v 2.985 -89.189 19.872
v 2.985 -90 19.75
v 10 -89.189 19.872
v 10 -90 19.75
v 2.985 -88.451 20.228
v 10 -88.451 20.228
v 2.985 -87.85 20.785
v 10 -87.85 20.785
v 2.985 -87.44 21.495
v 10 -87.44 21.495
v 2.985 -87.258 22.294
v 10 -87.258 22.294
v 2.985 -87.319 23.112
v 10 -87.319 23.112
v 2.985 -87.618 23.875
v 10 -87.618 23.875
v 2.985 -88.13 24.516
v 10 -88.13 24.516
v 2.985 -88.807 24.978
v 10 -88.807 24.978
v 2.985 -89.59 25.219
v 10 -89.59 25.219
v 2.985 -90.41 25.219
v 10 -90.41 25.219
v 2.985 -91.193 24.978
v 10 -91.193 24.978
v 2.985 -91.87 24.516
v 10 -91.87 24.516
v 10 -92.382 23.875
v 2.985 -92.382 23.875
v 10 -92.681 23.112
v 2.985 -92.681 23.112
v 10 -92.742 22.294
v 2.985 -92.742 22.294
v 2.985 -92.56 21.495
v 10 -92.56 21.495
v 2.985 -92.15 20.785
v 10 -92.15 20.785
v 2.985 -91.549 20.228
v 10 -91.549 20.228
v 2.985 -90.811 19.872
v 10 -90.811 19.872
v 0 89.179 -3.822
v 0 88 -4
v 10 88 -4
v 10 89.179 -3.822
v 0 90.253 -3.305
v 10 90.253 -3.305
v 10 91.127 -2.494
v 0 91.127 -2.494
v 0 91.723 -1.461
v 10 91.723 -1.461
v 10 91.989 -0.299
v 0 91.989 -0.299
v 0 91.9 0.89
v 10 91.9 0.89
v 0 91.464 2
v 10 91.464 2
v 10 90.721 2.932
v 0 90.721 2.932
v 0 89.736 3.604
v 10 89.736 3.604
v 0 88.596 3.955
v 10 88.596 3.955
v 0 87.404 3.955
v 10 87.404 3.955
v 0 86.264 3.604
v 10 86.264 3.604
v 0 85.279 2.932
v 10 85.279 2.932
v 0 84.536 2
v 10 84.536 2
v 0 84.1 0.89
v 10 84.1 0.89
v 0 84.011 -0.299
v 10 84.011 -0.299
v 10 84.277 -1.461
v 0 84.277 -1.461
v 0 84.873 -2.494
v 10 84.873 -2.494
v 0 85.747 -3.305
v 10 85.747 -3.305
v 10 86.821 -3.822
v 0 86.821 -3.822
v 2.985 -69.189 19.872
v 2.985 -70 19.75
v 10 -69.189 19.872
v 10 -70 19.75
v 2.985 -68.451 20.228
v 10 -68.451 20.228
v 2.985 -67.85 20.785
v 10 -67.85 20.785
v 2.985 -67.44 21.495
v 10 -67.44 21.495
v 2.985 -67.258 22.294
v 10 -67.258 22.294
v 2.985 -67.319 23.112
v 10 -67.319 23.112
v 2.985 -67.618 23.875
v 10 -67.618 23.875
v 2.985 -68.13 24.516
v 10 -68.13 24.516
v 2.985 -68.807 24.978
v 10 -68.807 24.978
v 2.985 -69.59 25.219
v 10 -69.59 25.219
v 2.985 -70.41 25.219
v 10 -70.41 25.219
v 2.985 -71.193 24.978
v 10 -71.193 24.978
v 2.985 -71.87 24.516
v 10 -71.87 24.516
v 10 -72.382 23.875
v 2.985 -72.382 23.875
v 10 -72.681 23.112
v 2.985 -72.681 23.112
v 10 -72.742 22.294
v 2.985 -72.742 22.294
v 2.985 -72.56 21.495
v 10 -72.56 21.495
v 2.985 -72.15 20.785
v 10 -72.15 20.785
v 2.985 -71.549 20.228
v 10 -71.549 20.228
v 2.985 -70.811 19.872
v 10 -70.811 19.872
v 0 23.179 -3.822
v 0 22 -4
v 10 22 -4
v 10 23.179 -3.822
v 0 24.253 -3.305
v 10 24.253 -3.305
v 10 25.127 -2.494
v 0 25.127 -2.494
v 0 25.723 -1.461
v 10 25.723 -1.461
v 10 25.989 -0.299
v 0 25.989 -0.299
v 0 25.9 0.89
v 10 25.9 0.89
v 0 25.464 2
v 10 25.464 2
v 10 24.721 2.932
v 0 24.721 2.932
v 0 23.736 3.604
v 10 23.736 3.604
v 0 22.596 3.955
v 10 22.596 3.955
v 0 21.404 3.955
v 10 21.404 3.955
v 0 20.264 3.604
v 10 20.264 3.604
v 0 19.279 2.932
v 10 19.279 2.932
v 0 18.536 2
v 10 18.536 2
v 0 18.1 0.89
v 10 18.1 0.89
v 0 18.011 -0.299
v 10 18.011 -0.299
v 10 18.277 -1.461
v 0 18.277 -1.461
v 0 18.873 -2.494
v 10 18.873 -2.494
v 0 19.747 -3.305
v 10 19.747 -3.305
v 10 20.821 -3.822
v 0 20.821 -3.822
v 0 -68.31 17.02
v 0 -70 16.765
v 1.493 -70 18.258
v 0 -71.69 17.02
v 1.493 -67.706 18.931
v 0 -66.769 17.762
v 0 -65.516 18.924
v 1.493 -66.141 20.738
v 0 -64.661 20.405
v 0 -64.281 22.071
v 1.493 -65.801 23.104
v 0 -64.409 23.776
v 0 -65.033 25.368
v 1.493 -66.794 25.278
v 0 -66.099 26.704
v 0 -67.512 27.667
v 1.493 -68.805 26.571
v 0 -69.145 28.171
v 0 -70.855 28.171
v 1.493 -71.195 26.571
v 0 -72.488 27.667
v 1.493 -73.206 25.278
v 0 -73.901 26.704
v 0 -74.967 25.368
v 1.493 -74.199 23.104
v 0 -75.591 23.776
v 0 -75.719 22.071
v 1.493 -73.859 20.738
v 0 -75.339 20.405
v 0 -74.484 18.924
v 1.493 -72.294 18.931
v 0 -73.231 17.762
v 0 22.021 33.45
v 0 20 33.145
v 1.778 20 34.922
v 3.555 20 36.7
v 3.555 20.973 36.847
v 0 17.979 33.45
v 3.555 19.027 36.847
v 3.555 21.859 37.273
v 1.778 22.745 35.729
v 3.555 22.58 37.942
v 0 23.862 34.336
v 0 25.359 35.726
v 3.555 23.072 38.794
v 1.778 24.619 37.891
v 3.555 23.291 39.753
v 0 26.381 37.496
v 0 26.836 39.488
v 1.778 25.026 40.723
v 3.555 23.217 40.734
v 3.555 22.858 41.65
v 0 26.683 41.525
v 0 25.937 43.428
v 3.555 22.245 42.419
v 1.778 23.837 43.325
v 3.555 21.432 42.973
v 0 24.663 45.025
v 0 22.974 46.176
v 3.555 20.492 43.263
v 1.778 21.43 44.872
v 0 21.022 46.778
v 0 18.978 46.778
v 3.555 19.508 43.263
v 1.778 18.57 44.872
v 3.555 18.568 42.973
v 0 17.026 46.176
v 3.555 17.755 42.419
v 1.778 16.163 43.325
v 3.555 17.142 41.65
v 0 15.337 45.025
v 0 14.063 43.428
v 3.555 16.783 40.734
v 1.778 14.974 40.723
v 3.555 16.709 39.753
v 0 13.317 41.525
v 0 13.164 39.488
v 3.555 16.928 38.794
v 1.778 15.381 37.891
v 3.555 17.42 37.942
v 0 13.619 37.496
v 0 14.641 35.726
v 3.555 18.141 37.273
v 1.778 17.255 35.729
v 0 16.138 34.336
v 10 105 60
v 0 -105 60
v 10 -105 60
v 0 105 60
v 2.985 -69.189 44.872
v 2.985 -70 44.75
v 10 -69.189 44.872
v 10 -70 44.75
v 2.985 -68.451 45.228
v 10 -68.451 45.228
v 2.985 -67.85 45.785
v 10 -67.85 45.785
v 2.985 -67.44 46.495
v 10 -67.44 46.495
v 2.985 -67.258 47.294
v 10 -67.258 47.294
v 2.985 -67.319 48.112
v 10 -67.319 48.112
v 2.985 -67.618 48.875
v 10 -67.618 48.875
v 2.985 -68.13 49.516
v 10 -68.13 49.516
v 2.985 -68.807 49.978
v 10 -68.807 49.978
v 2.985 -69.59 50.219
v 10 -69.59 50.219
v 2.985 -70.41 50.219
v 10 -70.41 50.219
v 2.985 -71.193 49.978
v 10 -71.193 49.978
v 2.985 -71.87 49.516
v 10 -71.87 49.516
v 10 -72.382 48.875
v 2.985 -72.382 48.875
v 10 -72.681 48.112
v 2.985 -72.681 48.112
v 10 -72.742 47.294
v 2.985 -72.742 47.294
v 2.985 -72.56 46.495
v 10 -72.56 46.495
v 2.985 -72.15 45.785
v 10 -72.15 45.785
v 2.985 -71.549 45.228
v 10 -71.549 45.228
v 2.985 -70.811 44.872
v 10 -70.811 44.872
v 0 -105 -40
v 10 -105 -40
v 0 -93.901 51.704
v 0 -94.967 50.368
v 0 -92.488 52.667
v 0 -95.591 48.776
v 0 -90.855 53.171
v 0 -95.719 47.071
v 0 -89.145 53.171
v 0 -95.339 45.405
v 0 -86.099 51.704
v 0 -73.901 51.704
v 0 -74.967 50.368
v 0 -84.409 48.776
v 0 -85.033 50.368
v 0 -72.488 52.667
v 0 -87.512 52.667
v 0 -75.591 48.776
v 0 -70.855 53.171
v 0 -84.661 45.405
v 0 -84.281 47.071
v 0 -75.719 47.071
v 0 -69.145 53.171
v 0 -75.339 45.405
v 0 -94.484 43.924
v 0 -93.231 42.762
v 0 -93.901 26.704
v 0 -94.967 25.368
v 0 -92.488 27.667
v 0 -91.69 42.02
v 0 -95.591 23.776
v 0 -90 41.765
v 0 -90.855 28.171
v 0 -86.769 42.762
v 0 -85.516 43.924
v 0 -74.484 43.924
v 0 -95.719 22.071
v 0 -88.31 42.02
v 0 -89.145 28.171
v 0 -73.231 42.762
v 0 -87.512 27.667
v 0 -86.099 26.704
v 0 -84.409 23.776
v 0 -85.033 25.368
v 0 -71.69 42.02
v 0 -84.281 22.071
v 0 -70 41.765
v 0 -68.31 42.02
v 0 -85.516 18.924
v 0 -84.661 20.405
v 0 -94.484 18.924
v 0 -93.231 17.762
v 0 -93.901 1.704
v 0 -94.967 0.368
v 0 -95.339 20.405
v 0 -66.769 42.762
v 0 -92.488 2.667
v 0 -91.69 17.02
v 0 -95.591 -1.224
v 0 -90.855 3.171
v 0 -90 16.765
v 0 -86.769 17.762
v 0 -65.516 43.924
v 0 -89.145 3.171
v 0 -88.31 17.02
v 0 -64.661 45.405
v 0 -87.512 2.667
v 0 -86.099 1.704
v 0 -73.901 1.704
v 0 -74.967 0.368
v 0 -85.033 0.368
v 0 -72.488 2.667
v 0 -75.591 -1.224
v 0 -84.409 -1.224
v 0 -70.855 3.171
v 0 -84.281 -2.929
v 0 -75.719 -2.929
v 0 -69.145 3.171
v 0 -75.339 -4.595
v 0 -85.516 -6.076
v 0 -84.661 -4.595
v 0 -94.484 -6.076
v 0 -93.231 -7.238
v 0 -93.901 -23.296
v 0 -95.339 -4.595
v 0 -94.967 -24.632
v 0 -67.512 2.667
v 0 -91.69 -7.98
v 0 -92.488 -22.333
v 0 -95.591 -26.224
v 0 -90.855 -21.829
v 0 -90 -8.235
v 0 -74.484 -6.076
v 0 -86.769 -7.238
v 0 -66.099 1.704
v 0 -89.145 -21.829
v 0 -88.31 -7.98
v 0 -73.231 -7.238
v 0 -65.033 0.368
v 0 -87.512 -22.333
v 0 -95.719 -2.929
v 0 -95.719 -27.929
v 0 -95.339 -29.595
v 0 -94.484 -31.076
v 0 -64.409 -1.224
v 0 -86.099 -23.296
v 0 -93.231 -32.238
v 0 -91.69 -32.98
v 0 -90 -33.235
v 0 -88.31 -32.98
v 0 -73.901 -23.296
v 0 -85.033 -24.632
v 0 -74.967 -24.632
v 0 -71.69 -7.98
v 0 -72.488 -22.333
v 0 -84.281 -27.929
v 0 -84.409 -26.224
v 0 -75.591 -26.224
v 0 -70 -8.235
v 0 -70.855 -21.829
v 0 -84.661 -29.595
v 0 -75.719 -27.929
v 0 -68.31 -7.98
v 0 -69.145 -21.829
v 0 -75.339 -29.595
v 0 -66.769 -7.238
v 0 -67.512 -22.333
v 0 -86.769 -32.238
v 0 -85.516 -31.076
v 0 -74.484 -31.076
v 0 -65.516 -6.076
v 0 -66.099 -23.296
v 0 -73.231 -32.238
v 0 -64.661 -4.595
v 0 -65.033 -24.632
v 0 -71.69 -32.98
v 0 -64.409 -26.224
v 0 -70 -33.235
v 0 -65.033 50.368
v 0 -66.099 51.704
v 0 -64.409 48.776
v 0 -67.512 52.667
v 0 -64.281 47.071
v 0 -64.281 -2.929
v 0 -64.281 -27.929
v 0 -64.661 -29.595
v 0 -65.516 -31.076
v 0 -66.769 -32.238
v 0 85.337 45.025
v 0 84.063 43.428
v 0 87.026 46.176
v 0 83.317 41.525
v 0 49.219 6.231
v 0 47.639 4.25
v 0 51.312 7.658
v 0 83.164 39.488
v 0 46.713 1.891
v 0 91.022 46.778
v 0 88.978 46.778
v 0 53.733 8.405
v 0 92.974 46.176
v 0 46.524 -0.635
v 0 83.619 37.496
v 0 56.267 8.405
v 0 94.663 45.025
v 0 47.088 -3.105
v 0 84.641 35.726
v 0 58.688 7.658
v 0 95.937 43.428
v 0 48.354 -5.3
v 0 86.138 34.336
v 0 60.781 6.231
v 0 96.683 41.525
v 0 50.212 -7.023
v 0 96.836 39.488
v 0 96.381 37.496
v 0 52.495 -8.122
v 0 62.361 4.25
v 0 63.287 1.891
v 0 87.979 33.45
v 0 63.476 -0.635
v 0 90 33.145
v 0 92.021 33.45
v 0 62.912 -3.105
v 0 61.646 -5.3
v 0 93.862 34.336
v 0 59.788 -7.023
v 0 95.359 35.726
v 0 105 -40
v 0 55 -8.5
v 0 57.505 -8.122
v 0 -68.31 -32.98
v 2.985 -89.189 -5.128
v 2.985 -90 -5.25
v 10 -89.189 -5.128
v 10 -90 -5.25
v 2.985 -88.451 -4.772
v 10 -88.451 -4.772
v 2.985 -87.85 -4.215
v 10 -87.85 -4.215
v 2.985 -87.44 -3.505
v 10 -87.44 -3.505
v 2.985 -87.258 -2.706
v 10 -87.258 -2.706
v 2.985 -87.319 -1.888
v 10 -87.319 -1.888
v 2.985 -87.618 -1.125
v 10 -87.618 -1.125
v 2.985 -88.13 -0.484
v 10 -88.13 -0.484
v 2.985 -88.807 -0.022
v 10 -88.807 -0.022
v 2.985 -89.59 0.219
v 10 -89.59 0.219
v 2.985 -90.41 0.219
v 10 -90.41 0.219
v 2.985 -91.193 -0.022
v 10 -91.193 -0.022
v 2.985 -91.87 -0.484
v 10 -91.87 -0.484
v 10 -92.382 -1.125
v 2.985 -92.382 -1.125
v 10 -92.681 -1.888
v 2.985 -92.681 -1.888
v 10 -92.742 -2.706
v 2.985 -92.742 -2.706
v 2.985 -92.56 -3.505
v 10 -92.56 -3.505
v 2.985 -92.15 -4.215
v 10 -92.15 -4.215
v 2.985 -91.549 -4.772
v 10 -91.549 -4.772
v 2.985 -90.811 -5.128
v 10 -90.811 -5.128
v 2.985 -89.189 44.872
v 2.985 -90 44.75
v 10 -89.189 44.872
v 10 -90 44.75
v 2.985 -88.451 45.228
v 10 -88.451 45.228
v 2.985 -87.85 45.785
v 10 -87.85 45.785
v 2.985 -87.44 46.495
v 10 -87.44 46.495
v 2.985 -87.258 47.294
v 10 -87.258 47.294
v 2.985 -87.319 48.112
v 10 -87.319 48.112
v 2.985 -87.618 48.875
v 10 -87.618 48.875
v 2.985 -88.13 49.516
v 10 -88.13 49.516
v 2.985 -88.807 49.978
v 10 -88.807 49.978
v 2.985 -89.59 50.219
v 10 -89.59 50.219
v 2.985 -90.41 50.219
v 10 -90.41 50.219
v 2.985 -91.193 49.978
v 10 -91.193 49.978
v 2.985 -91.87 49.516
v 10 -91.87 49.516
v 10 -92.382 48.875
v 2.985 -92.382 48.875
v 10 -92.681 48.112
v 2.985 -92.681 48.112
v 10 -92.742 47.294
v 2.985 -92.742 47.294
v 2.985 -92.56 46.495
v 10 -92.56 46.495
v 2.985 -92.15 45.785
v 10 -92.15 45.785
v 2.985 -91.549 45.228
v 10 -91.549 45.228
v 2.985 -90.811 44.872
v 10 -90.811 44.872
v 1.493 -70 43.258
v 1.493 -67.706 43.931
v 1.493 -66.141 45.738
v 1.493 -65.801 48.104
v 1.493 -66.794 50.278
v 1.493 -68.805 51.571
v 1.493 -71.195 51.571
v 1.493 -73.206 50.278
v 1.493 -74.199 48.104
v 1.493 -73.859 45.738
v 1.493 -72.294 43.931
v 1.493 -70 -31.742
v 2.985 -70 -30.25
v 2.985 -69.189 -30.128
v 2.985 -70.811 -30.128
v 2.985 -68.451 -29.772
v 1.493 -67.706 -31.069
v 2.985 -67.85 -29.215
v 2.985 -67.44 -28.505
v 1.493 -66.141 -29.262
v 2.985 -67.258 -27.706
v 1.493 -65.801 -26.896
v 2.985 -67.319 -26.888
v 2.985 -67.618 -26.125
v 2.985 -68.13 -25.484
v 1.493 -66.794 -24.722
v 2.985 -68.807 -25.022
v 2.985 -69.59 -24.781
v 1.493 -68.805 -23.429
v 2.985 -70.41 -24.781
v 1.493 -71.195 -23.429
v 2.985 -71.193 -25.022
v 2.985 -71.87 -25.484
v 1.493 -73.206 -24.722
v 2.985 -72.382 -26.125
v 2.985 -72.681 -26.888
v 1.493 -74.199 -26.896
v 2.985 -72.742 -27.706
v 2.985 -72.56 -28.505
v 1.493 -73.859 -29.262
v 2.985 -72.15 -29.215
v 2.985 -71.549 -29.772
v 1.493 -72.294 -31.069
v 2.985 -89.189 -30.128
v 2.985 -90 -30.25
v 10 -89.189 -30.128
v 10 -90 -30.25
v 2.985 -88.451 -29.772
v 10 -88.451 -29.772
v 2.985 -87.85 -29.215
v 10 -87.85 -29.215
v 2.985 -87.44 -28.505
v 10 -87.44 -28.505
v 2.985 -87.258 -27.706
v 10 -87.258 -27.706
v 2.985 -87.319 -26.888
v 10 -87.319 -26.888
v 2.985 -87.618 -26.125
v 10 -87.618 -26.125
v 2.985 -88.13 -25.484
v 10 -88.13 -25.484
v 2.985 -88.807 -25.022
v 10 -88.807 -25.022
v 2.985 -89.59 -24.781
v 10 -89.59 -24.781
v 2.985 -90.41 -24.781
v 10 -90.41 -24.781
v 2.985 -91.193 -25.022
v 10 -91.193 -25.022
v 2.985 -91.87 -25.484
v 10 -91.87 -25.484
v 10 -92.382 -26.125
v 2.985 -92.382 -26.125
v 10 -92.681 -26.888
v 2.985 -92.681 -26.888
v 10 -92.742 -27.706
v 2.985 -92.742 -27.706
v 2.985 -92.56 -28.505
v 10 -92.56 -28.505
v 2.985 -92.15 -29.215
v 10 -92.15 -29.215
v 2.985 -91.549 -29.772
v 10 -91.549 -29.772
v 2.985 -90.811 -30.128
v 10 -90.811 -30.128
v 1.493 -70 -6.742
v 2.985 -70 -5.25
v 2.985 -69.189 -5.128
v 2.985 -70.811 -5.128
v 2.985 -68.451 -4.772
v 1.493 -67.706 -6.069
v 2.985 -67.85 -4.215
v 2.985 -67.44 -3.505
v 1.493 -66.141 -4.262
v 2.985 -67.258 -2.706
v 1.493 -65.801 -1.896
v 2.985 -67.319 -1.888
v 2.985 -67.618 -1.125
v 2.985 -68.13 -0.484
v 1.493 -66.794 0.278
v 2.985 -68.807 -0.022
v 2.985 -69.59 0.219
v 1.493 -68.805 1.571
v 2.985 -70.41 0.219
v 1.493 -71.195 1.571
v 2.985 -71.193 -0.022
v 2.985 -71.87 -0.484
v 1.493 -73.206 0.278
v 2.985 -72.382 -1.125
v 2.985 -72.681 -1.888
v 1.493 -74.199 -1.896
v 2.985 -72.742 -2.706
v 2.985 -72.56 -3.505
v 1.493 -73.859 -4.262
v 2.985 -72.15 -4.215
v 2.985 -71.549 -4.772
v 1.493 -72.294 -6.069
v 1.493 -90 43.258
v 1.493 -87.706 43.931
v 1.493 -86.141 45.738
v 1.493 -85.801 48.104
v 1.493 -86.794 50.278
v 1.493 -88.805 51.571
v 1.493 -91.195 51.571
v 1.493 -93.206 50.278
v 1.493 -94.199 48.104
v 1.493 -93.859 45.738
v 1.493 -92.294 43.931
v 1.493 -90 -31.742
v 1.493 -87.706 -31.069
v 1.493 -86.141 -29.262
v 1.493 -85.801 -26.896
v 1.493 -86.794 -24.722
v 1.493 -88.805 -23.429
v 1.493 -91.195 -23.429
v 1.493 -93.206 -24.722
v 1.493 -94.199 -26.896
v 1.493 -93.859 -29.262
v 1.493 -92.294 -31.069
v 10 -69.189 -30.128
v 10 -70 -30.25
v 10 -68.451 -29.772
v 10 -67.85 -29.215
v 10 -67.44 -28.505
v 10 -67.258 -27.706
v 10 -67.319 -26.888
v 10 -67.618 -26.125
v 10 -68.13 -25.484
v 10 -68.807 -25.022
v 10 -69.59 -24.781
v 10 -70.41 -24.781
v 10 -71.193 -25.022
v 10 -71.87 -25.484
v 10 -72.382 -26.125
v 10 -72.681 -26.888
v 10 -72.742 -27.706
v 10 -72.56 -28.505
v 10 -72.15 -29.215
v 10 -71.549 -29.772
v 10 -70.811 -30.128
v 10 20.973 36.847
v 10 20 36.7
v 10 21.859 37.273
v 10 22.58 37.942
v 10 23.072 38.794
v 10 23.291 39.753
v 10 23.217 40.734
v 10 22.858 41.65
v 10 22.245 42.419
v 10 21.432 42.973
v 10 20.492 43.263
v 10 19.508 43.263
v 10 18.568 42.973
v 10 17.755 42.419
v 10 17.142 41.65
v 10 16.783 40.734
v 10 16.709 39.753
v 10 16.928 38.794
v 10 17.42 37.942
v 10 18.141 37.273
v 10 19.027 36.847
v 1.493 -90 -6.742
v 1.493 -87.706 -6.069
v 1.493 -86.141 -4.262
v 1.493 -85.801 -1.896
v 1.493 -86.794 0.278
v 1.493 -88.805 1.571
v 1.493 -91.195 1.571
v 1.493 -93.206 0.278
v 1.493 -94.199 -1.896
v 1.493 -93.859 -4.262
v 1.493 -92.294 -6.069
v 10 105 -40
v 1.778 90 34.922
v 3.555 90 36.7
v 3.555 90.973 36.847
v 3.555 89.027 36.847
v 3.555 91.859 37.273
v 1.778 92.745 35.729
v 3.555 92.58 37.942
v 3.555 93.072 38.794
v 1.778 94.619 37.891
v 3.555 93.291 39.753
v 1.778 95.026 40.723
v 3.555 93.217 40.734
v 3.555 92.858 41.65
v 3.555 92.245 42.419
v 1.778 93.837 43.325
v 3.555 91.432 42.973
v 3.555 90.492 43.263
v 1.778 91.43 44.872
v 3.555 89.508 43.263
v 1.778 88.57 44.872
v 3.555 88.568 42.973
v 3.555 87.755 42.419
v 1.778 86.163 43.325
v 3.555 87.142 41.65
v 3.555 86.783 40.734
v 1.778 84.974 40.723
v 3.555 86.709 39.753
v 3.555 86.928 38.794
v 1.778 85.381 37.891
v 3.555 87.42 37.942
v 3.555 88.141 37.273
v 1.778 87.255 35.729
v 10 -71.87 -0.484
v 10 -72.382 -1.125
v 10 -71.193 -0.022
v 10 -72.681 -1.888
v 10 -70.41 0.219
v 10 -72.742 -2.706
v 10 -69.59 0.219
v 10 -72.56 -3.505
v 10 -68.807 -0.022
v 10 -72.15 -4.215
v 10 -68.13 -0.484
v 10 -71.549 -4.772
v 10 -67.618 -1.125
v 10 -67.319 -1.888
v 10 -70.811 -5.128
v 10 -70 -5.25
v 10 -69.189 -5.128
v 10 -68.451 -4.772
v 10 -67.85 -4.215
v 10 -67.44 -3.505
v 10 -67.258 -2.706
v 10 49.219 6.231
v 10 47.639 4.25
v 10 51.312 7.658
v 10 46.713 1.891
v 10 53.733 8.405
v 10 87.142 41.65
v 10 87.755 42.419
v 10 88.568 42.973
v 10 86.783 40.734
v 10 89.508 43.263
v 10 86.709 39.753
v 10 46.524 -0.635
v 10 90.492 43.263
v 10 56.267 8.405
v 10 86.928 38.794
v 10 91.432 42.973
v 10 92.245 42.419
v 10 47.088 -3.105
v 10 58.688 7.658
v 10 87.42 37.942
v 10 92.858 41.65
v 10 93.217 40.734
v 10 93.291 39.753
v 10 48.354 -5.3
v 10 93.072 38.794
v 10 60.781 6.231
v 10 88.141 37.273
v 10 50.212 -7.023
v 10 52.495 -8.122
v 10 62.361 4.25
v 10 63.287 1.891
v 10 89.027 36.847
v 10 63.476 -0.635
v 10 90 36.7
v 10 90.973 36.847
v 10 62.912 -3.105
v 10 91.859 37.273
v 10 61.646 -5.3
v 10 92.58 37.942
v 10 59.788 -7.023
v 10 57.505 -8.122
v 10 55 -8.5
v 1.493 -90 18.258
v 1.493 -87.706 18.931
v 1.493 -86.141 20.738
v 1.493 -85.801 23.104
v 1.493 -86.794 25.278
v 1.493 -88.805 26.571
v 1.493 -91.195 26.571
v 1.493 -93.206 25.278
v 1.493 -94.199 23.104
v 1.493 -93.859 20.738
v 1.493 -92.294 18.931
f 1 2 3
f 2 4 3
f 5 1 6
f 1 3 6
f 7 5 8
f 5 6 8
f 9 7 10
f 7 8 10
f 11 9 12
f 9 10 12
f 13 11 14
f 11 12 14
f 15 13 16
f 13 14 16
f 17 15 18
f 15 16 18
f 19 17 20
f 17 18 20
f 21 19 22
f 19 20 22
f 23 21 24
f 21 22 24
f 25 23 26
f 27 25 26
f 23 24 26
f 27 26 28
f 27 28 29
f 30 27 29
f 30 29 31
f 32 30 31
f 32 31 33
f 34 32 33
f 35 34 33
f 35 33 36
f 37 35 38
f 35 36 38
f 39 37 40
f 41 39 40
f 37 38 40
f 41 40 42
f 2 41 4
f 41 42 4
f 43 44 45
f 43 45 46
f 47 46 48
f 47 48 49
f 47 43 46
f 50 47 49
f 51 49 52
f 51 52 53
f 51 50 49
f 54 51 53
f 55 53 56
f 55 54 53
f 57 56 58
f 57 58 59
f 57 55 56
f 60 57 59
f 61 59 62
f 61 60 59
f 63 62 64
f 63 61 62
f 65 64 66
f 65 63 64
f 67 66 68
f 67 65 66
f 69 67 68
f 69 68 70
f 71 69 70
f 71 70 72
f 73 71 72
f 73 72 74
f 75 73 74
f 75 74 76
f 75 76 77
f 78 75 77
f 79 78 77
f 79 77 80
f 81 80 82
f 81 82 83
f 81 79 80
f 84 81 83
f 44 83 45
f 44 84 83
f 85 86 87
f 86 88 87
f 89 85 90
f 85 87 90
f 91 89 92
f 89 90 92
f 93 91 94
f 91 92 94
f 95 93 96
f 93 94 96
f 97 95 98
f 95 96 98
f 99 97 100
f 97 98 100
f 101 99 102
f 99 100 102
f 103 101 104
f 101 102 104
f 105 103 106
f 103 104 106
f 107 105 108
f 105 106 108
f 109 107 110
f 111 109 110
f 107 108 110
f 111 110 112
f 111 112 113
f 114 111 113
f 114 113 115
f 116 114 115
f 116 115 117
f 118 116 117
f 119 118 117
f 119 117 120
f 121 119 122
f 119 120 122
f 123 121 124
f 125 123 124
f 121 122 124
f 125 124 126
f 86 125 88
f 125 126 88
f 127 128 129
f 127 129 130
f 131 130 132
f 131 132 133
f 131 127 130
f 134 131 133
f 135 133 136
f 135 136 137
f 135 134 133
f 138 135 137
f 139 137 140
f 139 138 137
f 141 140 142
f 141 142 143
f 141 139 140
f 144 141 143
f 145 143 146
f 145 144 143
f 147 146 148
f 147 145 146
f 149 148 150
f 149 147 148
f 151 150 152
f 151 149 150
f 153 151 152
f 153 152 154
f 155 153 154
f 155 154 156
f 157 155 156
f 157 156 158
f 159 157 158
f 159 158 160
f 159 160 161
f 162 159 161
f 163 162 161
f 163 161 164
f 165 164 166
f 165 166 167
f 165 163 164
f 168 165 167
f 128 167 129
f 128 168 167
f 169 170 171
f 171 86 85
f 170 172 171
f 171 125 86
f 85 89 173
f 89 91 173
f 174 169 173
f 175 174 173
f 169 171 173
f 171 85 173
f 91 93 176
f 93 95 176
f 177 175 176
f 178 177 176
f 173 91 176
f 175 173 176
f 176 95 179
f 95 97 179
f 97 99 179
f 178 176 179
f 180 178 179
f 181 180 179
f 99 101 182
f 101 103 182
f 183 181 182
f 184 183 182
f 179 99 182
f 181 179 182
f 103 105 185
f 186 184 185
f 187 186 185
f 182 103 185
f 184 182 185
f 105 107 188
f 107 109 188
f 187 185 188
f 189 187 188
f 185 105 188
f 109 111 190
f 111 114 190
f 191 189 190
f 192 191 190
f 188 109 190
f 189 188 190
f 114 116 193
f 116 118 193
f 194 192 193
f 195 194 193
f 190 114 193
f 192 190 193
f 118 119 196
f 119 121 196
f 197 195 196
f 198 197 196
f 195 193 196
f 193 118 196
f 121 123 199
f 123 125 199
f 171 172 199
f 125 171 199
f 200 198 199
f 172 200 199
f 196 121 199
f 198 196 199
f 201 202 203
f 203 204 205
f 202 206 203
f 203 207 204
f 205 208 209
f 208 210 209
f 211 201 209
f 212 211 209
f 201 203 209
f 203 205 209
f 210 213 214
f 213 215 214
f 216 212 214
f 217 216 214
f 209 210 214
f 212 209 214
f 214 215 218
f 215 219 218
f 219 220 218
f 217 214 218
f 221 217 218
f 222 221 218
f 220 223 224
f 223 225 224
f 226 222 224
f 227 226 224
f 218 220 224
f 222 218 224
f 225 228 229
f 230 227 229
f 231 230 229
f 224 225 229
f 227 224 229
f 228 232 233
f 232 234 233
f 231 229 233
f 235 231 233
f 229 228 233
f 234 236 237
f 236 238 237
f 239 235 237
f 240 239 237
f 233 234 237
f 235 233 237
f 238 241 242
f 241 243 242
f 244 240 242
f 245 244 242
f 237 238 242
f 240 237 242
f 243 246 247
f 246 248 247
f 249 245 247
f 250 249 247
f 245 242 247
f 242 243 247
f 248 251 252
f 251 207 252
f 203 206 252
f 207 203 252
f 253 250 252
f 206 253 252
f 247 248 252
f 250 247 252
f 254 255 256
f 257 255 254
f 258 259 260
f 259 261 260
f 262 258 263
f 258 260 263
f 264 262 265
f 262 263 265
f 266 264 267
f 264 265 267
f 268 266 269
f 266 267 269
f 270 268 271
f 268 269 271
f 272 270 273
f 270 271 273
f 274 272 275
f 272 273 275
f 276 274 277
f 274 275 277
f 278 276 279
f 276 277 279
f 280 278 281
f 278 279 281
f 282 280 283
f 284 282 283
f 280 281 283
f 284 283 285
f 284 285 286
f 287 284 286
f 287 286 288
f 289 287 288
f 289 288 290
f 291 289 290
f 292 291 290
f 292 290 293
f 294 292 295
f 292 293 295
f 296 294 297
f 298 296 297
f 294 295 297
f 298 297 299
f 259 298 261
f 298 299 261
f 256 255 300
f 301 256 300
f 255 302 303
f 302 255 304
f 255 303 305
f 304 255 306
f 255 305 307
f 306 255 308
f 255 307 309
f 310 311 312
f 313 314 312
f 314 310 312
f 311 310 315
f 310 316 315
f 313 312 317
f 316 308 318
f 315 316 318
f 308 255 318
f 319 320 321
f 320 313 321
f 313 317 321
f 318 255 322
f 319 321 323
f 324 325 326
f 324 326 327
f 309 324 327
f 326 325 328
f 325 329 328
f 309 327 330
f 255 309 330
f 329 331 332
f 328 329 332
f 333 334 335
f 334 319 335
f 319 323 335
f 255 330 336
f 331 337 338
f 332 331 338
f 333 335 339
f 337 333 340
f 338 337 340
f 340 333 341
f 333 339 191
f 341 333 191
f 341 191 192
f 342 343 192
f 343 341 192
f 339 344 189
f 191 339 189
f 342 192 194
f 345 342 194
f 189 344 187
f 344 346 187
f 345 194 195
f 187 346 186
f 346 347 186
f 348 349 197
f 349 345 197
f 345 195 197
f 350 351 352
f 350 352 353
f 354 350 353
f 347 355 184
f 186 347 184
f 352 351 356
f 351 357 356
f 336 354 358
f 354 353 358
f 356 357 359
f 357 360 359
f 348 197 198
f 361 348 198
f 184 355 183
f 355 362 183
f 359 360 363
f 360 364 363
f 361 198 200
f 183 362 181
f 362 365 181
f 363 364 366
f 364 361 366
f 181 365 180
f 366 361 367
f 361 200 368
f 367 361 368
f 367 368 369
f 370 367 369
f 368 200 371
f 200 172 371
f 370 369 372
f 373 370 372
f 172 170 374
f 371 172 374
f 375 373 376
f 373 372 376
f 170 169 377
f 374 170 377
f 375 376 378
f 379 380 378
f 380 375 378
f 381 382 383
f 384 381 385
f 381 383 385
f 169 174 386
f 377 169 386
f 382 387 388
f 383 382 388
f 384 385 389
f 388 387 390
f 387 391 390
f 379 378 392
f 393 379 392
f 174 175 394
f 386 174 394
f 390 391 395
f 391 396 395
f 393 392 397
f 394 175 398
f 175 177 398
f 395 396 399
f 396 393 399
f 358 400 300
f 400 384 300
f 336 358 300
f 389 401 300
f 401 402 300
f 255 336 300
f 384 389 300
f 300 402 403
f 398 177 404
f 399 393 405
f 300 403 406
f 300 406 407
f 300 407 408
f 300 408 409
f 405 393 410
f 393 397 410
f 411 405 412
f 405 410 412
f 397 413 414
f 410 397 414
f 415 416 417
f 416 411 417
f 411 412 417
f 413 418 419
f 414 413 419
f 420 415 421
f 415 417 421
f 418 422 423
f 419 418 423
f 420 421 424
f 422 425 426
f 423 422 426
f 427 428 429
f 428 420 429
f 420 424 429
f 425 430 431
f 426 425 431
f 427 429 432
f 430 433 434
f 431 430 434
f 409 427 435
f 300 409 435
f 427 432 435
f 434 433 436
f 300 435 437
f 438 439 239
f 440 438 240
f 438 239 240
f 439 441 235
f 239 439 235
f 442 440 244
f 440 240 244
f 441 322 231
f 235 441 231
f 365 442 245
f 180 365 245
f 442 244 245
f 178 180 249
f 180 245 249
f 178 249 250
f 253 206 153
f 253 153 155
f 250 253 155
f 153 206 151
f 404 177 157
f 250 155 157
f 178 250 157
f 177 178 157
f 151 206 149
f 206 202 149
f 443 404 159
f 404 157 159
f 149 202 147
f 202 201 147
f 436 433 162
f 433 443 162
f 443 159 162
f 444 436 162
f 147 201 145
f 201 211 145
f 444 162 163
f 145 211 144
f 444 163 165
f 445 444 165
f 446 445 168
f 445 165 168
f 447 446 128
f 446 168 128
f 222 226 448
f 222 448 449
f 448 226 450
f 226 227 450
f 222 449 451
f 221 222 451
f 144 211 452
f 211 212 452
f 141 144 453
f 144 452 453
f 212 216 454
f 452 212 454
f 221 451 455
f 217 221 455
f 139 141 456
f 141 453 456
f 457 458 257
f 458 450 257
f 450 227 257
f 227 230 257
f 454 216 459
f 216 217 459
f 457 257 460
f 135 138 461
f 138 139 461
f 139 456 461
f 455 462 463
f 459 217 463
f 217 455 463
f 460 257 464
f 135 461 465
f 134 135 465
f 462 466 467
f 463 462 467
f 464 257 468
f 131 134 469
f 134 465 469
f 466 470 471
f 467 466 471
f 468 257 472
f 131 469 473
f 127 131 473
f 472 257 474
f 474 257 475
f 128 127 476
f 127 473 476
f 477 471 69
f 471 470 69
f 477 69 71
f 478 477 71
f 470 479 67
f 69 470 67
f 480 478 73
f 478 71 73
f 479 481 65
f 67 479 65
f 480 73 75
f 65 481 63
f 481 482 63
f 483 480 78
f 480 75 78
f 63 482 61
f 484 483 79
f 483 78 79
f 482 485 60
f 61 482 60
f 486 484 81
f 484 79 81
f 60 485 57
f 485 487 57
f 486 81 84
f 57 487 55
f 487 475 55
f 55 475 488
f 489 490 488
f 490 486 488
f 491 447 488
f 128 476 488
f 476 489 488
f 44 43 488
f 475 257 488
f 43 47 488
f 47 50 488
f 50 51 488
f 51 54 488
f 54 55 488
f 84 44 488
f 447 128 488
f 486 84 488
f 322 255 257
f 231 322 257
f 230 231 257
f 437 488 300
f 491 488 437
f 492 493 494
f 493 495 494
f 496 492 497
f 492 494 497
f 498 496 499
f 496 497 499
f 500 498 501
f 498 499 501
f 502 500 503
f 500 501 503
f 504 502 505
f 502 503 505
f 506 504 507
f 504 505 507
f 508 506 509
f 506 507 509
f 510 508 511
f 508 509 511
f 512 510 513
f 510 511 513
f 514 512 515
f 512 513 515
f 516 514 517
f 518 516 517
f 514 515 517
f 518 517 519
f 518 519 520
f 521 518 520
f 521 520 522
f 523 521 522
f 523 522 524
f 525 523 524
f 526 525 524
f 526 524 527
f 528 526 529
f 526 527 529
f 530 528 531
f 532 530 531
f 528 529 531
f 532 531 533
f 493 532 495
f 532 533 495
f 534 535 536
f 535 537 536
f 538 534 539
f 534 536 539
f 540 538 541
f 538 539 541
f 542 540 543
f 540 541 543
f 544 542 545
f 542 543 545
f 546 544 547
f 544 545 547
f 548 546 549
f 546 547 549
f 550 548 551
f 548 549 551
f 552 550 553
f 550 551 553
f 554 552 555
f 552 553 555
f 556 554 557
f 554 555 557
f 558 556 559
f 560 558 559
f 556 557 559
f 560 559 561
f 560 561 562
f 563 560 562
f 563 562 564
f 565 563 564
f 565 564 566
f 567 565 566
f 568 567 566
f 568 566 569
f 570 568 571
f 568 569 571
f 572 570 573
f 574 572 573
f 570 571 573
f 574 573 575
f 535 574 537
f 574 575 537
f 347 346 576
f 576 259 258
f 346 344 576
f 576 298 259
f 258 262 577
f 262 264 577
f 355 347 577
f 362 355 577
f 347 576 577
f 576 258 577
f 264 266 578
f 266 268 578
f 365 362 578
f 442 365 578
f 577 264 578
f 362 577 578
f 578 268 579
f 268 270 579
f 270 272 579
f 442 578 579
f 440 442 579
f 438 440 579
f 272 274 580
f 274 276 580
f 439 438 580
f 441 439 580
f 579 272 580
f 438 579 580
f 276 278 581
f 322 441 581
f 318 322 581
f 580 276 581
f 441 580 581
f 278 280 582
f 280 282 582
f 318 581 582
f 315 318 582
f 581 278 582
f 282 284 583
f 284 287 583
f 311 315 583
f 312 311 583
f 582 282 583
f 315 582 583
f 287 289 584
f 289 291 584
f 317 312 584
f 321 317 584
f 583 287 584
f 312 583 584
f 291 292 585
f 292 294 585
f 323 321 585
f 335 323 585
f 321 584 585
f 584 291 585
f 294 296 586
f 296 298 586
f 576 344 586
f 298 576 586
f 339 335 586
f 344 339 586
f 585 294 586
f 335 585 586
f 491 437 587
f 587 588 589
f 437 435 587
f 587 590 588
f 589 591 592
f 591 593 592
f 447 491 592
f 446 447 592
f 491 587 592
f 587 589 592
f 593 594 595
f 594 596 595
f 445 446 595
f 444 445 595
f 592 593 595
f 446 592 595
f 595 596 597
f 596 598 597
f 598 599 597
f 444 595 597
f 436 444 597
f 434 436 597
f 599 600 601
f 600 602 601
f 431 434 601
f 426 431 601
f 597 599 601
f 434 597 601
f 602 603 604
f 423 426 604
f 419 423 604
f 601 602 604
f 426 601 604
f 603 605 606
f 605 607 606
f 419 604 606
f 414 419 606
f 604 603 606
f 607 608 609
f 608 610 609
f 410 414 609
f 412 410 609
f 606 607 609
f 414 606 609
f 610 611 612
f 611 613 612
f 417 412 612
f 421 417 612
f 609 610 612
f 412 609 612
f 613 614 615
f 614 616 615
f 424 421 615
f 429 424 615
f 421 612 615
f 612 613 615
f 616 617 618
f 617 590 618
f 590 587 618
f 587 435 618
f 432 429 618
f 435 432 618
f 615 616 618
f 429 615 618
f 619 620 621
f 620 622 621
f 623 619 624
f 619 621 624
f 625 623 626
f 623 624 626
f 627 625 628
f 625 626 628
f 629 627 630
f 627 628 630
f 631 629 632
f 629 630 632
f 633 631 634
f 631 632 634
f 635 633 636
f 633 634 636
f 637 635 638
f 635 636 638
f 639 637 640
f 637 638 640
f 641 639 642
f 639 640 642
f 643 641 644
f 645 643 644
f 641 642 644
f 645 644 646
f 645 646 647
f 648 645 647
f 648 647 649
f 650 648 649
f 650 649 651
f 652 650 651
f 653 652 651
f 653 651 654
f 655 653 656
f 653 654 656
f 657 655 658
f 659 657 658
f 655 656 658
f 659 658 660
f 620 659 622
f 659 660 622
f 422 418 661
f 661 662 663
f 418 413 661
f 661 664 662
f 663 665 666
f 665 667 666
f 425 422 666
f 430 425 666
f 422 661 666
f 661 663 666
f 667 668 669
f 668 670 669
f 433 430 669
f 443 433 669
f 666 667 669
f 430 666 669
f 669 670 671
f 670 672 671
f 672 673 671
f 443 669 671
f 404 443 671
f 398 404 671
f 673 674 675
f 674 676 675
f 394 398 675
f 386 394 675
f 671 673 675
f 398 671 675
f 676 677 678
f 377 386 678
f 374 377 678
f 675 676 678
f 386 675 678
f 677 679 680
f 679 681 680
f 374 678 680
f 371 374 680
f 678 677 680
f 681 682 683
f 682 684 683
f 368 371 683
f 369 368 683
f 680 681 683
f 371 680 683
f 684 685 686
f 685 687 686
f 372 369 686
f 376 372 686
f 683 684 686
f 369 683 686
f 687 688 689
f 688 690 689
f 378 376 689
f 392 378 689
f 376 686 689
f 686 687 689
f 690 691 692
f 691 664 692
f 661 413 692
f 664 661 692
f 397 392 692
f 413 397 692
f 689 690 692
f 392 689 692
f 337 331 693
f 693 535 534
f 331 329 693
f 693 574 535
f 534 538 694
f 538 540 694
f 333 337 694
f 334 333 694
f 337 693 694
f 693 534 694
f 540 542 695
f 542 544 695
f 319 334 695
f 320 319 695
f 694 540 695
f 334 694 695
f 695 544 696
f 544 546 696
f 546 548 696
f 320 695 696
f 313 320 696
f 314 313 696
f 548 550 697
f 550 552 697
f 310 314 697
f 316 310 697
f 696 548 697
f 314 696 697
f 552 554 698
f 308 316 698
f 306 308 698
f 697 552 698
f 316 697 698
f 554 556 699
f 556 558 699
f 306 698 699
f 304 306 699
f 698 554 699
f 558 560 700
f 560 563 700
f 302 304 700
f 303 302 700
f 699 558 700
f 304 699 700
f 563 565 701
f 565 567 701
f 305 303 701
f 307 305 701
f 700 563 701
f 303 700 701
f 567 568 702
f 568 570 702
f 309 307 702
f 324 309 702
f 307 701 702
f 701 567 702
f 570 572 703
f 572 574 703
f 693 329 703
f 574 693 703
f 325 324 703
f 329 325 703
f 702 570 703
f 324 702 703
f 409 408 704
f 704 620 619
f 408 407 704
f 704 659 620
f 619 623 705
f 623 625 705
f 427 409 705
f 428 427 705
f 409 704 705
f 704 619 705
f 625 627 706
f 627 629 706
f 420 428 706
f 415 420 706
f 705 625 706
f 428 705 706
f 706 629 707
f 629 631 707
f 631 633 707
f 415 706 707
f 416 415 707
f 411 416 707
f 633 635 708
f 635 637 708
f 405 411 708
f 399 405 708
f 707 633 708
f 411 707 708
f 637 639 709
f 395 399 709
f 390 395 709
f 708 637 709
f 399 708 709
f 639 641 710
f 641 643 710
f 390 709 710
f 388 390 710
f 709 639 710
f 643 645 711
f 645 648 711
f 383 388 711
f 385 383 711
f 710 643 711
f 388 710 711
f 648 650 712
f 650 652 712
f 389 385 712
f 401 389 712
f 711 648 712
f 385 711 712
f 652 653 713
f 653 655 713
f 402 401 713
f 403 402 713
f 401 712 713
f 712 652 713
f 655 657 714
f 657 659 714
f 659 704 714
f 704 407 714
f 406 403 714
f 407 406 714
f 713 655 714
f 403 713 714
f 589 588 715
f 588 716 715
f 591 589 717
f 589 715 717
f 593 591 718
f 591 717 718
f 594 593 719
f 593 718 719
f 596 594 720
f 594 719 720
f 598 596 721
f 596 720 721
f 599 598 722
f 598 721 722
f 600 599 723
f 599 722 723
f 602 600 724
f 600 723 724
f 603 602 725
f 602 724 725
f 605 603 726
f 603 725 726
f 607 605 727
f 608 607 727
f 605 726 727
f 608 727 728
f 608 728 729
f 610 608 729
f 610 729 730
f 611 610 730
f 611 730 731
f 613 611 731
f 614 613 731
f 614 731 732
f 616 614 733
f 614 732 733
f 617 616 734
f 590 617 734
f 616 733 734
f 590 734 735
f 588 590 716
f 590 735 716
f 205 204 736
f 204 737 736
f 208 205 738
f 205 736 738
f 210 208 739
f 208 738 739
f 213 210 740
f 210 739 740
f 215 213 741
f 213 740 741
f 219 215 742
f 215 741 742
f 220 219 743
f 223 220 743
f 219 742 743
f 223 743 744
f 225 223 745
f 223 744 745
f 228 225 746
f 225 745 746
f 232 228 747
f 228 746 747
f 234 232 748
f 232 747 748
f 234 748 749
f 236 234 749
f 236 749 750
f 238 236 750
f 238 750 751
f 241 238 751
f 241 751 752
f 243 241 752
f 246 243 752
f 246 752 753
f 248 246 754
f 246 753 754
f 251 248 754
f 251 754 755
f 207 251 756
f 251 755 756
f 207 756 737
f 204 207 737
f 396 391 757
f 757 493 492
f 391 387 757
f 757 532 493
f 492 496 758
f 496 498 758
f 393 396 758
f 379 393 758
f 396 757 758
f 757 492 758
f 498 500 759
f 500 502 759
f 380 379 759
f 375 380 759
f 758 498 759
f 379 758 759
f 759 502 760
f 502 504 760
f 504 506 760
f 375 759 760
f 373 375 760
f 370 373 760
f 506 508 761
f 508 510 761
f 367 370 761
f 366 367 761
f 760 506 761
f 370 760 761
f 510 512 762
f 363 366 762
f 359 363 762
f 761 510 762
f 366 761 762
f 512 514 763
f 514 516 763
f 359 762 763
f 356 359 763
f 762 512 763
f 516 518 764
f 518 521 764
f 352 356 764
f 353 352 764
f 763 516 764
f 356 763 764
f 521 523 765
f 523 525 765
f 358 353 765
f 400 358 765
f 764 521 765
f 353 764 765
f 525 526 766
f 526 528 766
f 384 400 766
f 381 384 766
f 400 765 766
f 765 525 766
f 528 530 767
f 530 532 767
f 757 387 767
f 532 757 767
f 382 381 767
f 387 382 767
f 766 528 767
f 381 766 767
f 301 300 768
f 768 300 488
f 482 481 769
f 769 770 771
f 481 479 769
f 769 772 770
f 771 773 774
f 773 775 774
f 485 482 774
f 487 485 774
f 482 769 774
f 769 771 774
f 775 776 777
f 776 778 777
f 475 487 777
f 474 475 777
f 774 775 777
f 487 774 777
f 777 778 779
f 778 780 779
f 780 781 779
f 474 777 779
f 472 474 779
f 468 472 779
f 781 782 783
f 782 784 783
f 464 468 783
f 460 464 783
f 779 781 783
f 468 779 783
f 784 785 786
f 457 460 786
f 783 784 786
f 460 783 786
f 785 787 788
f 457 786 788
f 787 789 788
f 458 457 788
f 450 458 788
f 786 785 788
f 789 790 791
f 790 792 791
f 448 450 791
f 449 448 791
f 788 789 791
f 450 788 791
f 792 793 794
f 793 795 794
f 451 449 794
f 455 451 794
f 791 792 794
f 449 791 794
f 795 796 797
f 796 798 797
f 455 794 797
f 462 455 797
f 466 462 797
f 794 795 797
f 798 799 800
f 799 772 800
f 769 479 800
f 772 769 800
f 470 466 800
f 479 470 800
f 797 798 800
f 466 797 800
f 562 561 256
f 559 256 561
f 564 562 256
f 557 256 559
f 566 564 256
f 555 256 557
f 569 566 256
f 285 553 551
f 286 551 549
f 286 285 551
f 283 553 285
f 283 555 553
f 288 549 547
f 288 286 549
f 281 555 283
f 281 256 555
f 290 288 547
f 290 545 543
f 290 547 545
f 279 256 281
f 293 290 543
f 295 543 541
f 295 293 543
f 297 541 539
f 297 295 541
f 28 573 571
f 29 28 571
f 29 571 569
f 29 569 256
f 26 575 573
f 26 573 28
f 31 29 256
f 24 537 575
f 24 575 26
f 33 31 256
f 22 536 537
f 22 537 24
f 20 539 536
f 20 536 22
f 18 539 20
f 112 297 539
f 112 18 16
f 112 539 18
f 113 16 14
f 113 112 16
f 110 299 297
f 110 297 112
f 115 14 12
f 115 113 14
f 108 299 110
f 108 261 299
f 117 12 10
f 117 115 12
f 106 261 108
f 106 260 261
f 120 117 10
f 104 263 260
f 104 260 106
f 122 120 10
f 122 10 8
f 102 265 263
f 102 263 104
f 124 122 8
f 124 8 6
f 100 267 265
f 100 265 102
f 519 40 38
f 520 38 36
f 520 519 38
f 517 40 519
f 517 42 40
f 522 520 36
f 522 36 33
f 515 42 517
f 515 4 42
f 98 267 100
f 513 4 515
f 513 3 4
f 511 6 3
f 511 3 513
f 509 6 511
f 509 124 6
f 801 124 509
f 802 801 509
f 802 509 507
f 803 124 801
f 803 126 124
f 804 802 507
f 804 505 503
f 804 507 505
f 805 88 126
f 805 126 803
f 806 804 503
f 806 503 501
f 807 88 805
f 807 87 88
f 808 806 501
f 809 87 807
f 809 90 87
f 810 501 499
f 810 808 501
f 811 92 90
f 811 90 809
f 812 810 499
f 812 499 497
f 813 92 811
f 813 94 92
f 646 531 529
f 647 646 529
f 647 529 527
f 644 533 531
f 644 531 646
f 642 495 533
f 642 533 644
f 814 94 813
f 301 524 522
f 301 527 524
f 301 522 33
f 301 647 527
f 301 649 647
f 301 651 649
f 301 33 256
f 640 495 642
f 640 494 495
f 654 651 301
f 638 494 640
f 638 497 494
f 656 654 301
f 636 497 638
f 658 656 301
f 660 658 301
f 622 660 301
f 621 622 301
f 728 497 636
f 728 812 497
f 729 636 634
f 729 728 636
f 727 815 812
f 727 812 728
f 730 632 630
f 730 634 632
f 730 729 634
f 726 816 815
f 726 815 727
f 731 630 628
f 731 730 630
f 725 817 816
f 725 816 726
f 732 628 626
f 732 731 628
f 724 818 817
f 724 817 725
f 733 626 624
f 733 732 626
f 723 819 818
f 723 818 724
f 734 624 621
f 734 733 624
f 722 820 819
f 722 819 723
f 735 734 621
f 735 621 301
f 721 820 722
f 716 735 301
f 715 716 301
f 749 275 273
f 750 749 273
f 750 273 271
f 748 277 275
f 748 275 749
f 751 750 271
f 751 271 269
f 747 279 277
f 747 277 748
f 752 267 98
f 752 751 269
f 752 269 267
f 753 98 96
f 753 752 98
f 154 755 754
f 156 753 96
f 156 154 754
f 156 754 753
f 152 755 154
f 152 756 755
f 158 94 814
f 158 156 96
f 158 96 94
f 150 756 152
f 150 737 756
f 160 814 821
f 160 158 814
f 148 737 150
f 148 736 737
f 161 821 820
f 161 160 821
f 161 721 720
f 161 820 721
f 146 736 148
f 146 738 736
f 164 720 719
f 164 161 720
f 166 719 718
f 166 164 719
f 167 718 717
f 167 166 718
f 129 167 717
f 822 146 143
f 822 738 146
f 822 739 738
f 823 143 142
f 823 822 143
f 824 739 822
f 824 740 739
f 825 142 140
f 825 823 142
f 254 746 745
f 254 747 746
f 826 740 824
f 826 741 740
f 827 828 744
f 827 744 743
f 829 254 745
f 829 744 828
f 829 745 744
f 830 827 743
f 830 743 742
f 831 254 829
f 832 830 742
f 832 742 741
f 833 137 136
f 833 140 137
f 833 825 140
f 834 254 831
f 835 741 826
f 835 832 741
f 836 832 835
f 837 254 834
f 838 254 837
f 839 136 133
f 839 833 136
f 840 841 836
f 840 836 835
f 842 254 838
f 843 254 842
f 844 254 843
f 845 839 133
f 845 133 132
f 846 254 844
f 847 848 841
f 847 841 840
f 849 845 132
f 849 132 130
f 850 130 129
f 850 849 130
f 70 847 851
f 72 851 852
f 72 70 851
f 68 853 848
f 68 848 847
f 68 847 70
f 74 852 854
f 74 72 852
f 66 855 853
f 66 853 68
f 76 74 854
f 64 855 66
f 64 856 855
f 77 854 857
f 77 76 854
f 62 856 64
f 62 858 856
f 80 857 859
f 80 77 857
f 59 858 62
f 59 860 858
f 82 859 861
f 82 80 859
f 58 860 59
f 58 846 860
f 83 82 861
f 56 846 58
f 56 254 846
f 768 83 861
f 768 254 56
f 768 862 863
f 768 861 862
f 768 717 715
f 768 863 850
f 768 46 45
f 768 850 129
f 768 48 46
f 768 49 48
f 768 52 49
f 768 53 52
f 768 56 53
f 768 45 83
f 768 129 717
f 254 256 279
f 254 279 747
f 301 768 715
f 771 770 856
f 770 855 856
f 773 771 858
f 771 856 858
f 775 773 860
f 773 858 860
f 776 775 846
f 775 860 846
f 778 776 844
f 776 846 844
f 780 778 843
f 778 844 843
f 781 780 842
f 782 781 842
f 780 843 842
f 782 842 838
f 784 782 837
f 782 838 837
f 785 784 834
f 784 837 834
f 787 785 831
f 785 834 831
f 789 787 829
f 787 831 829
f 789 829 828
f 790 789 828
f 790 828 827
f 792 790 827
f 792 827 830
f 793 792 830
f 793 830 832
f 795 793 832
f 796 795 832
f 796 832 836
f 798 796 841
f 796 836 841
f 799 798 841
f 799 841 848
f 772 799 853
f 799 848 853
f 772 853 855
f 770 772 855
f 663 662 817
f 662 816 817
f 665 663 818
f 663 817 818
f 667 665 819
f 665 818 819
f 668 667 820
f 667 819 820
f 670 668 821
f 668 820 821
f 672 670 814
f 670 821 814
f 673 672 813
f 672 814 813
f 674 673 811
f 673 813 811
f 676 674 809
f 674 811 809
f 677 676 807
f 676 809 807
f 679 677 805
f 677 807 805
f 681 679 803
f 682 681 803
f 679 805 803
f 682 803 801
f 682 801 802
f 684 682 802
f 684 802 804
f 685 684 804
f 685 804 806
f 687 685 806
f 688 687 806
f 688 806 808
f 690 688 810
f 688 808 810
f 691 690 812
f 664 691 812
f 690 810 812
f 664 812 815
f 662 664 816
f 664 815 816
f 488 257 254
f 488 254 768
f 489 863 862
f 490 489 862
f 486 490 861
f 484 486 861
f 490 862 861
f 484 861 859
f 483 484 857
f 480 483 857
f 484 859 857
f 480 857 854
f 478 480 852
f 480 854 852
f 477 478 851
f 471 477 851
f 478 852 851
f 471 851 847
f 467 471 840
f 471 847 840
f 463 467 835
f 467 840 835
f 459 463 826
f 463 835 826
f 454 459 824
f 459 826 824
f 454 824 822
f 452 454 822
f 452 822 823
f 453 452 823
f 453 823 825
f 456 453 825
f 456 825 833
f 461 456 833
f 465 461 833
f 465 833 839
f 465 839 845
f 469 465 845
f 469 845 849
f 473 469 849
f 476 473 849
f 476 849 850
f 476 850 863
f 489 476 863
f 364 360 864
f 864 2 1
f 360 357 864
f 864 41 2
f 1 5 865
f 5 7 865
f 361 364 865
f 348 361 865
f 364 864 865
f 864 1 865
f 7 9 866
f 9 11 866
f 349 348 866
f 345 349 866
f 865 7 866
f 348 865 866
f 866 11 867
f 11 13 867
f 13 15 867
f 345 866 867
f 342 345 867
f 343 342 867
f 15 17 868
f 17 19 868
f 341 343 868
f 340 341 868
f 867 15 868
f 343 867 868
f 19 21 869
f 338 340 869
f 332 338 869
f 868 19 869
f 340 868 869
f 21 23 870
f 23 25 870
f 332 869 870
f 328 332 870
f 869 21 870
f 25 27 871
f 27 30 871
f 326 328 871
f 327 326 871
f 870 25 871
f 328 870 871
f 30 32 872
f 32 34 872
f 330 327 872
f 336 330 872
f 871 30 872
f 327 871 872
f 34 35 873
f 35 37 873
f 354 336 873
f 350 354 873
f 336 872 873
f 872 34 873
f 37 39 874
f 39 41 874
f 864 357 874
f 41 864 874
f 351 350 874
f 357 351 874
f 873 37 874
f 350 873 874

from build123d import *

# Parameters (mm, degrees)
SKETCH2_W                                            = 100
SKETCH2_H                                            = 210
SKETCH2_R                                            = 4
BOSS_EXTRUDE1_DEPTH                                  = 10
SKETCH3_R                                            = 2.5
MOUNT_DEPTH                                          = 11
SKETCH7_R                                            = 2.5
SUPPORT_PROFILE_MOUNT_DEPTH                          = 11
SKETCH5_R                                            = 8.5
BEARING_MOUNT_DEPTH                                  = 11
CSK_FOR_M6_SOCKET_COUNTERSUNK_HEAD_SCREW_D           = 6.6
CSK_FOR_M6_SOCKET_COUNTERSUNK_HEAD_SCREW_DEPTH       = 15
CSK_FOR_M6_SOCKET_COUNTERSUNK_HEAD_SCREW_CSINK_D     = 13.71
CSK_FOR_M6_SOCKET_COUNTERSUNK_HEAD_SCREW_CSINK_ANGLE = 90
CSK_FOR_M6_SOCKET_COUNTERSUNK_HEAD_SCREW_TIP         = 1.982840043
CSK_FOR_M5_SOCKET_COUNTERSUNK_HEAD_SCREW_D           = 5.5
CSK_FOR_M5_SOCKET_COUNTERSUNK_HEAD_SCREW_DEPTH       = 15
CSK_FOR_M5_SOCKET_COUNTERSUNK_HEAD_SCREW_CSINK_D     = 11.47
CSK_FOR_M5_SOCKET_COUNTERSUNK_HEAD_SCREW_CSINK_ANGLE = 90
CSK_FOR_M5_SOCKET_COUNTERSUNK_HEAD_SCREW_TIP         = 1.652366702


with BuildPart() as part:
    # Sketch2 → Boss-Extrude1 (new body)
    with BuildSketch(Plane(origin=(0, 0, 0), x_dir=(0, 0, -1), z_dir=(1, 0, 0))):
        with Locations((-10, 0)):
            Rectangle(SKETCH2_W, SKETCH2_H)
        with Locations((0, 88)):
            Circle(SKETCH2_R, mode=Mode.SUBTRACT)
        with Locations((0, 22)):
            Circle(SKETCH2_R, mode=Mode.SUBTRACT)
    extrude(amount=BOSS_EXTRUDE1_DEPTH)

    # Sketch3 → mount (cut, through all)
    with BuildSketch(Plane(origin=(10, 0, 0), x_dir=(0, 0, -1), z_dir=(1, 0, 0))):
        with Locations((-22.5, -70)):
            Circle(SKETCH3_R)
        with Locations((-47.5, -70)):
            Circle(SKETCH3_R)
        with Locations((-47.5, -90)):
            Circle(SKETCH3_R)
        with Locations((-22.5, -90)):
            Circle(SKETCH3_R)
        with Locations((2.5, -90)):
            Circle(SKETCH3_R)
        with Locations((27.5, -90)):
            Circle(SKETCH3_R)
        with Locations((27.5, -70)):
            Circle(SKETCH3_R)
        with Locations((2.5, -70)):
            Circle(SKETCH3_R)
    extrude(amount=-MOUNT_DEPTH, mode=Mode.SUBTRACT)

    # Sketch7 → support_profile_mount (cut, through all)
    with BuildSketch(Plane(origin=(10, 0, 0), x_dir=(0, 0, -1), z_dir=(1, 0, 0))):
        with Locations((-40, 90)):
            Circle(SKETCH7_R)
        with Locations((-40, 20)):
            Circle(SKETCH7_R)
    extrude(amount=-SUPPORT_PROFILE_MOUNT_DEPTH, mode=Mode.SUBTRACT)

    # Sketch5 → bearing_mount (cut, through all)
    with BuildSketch(Plane(origin=(10, 0, 0), x_dir=(0, 0, -1), z_dir=(1, 0, 0))):
        with Locations((0, 55)):
            Circle(SKETCH5_R)
    extrude(amount=-BEARING_MOUNT_DEPTH, mode=Mode.SUBTRACT)

    # CSK for M6 socket countersunk head screw
    with Locations(Plane.ZY):
        with Locations((40, 90), (40, 20)):
            CounterSinkHole(CSK_FOR_M6_SOCKET_COUNTERSUNK_HEAD_SCREW_D / 2, CSK_FOR_M6_SOCKET_COUNTERSUNK_HEAD_SCREW_CSINK_D / 2, depth=CSK_FOR_M6_SOCKET_COUNTERSUNK_HEAD_SCREW_DEPTH, counter_sink_angle=CSK_FOR_M6_SOCKET_COUNTERSUNK_HEAD_SCREW_CSINK_ANGLE)
            with Locations((0, 0, -(CSK_FOR_M6_SOCKET_COUNTERSUNK_HEAD_SCREW_DEPTH + CSK_FOR_M6_SOCKET_COUNTERSUNK_HEAD_SCREW_TIP / 2))):  # 118° drill point
                Cone(0, CSK_FOR_M6_SOCKET_COUNTERSUNK_HEAD_SCREW_D / 2, CSK_FOR_M6_SOCKET_COUNTERSUNK_HEAD_SCREW_TIP, mode=Mode.SUBTRACT)

    # CSK for M5 socket countersunk head screw
    with Locations(Plane.ZY):
        with Locations((-27.5, -70), (-2.5, -70), (22.5, -70), (47.5, -70), (47.5, -90), (22.5, -90), (-2.5, -90), (-27.5, -90)):
            CounterSinkHole(CSK_FOR_M5_SOCKET_COUNTERSUNK_HEAD_SCREW_D / 2, CSK_FOR_M5_SOCKET_COUNTERSUNK_HEAD_SCREW_CSINK_D / 2, depth=CSK_FOR_M5_SOCKET_COUNTERSUNK_HEAD_SCREW_DEPTH, counter_sink_angle=CSK_FOR_M5_SOCKET_COUNTERSUNK_HEAD_SCREW_CSINK_ANGLE)
            with Locations((0, 0, -(CSK_FOR_M5_SOCKET_COUNTERSUNK_HEAD_SCREW_DEPTH + CSK_FOR_M5_SOCKET_COUNTERSUNK_HEAD_SCREW_TIP / 2))):  # 118° drill point
                Cone(0, CSK_FOR_M5_SOCKET_COUNTERSUNK_HEAD_SCREW_D / 2, CSK_FOR_M5_SOCKET_COUNTERSUNK_HEAD_SCREW_TIP, mode=Mode.SUBTRACT)


solid = part.part
